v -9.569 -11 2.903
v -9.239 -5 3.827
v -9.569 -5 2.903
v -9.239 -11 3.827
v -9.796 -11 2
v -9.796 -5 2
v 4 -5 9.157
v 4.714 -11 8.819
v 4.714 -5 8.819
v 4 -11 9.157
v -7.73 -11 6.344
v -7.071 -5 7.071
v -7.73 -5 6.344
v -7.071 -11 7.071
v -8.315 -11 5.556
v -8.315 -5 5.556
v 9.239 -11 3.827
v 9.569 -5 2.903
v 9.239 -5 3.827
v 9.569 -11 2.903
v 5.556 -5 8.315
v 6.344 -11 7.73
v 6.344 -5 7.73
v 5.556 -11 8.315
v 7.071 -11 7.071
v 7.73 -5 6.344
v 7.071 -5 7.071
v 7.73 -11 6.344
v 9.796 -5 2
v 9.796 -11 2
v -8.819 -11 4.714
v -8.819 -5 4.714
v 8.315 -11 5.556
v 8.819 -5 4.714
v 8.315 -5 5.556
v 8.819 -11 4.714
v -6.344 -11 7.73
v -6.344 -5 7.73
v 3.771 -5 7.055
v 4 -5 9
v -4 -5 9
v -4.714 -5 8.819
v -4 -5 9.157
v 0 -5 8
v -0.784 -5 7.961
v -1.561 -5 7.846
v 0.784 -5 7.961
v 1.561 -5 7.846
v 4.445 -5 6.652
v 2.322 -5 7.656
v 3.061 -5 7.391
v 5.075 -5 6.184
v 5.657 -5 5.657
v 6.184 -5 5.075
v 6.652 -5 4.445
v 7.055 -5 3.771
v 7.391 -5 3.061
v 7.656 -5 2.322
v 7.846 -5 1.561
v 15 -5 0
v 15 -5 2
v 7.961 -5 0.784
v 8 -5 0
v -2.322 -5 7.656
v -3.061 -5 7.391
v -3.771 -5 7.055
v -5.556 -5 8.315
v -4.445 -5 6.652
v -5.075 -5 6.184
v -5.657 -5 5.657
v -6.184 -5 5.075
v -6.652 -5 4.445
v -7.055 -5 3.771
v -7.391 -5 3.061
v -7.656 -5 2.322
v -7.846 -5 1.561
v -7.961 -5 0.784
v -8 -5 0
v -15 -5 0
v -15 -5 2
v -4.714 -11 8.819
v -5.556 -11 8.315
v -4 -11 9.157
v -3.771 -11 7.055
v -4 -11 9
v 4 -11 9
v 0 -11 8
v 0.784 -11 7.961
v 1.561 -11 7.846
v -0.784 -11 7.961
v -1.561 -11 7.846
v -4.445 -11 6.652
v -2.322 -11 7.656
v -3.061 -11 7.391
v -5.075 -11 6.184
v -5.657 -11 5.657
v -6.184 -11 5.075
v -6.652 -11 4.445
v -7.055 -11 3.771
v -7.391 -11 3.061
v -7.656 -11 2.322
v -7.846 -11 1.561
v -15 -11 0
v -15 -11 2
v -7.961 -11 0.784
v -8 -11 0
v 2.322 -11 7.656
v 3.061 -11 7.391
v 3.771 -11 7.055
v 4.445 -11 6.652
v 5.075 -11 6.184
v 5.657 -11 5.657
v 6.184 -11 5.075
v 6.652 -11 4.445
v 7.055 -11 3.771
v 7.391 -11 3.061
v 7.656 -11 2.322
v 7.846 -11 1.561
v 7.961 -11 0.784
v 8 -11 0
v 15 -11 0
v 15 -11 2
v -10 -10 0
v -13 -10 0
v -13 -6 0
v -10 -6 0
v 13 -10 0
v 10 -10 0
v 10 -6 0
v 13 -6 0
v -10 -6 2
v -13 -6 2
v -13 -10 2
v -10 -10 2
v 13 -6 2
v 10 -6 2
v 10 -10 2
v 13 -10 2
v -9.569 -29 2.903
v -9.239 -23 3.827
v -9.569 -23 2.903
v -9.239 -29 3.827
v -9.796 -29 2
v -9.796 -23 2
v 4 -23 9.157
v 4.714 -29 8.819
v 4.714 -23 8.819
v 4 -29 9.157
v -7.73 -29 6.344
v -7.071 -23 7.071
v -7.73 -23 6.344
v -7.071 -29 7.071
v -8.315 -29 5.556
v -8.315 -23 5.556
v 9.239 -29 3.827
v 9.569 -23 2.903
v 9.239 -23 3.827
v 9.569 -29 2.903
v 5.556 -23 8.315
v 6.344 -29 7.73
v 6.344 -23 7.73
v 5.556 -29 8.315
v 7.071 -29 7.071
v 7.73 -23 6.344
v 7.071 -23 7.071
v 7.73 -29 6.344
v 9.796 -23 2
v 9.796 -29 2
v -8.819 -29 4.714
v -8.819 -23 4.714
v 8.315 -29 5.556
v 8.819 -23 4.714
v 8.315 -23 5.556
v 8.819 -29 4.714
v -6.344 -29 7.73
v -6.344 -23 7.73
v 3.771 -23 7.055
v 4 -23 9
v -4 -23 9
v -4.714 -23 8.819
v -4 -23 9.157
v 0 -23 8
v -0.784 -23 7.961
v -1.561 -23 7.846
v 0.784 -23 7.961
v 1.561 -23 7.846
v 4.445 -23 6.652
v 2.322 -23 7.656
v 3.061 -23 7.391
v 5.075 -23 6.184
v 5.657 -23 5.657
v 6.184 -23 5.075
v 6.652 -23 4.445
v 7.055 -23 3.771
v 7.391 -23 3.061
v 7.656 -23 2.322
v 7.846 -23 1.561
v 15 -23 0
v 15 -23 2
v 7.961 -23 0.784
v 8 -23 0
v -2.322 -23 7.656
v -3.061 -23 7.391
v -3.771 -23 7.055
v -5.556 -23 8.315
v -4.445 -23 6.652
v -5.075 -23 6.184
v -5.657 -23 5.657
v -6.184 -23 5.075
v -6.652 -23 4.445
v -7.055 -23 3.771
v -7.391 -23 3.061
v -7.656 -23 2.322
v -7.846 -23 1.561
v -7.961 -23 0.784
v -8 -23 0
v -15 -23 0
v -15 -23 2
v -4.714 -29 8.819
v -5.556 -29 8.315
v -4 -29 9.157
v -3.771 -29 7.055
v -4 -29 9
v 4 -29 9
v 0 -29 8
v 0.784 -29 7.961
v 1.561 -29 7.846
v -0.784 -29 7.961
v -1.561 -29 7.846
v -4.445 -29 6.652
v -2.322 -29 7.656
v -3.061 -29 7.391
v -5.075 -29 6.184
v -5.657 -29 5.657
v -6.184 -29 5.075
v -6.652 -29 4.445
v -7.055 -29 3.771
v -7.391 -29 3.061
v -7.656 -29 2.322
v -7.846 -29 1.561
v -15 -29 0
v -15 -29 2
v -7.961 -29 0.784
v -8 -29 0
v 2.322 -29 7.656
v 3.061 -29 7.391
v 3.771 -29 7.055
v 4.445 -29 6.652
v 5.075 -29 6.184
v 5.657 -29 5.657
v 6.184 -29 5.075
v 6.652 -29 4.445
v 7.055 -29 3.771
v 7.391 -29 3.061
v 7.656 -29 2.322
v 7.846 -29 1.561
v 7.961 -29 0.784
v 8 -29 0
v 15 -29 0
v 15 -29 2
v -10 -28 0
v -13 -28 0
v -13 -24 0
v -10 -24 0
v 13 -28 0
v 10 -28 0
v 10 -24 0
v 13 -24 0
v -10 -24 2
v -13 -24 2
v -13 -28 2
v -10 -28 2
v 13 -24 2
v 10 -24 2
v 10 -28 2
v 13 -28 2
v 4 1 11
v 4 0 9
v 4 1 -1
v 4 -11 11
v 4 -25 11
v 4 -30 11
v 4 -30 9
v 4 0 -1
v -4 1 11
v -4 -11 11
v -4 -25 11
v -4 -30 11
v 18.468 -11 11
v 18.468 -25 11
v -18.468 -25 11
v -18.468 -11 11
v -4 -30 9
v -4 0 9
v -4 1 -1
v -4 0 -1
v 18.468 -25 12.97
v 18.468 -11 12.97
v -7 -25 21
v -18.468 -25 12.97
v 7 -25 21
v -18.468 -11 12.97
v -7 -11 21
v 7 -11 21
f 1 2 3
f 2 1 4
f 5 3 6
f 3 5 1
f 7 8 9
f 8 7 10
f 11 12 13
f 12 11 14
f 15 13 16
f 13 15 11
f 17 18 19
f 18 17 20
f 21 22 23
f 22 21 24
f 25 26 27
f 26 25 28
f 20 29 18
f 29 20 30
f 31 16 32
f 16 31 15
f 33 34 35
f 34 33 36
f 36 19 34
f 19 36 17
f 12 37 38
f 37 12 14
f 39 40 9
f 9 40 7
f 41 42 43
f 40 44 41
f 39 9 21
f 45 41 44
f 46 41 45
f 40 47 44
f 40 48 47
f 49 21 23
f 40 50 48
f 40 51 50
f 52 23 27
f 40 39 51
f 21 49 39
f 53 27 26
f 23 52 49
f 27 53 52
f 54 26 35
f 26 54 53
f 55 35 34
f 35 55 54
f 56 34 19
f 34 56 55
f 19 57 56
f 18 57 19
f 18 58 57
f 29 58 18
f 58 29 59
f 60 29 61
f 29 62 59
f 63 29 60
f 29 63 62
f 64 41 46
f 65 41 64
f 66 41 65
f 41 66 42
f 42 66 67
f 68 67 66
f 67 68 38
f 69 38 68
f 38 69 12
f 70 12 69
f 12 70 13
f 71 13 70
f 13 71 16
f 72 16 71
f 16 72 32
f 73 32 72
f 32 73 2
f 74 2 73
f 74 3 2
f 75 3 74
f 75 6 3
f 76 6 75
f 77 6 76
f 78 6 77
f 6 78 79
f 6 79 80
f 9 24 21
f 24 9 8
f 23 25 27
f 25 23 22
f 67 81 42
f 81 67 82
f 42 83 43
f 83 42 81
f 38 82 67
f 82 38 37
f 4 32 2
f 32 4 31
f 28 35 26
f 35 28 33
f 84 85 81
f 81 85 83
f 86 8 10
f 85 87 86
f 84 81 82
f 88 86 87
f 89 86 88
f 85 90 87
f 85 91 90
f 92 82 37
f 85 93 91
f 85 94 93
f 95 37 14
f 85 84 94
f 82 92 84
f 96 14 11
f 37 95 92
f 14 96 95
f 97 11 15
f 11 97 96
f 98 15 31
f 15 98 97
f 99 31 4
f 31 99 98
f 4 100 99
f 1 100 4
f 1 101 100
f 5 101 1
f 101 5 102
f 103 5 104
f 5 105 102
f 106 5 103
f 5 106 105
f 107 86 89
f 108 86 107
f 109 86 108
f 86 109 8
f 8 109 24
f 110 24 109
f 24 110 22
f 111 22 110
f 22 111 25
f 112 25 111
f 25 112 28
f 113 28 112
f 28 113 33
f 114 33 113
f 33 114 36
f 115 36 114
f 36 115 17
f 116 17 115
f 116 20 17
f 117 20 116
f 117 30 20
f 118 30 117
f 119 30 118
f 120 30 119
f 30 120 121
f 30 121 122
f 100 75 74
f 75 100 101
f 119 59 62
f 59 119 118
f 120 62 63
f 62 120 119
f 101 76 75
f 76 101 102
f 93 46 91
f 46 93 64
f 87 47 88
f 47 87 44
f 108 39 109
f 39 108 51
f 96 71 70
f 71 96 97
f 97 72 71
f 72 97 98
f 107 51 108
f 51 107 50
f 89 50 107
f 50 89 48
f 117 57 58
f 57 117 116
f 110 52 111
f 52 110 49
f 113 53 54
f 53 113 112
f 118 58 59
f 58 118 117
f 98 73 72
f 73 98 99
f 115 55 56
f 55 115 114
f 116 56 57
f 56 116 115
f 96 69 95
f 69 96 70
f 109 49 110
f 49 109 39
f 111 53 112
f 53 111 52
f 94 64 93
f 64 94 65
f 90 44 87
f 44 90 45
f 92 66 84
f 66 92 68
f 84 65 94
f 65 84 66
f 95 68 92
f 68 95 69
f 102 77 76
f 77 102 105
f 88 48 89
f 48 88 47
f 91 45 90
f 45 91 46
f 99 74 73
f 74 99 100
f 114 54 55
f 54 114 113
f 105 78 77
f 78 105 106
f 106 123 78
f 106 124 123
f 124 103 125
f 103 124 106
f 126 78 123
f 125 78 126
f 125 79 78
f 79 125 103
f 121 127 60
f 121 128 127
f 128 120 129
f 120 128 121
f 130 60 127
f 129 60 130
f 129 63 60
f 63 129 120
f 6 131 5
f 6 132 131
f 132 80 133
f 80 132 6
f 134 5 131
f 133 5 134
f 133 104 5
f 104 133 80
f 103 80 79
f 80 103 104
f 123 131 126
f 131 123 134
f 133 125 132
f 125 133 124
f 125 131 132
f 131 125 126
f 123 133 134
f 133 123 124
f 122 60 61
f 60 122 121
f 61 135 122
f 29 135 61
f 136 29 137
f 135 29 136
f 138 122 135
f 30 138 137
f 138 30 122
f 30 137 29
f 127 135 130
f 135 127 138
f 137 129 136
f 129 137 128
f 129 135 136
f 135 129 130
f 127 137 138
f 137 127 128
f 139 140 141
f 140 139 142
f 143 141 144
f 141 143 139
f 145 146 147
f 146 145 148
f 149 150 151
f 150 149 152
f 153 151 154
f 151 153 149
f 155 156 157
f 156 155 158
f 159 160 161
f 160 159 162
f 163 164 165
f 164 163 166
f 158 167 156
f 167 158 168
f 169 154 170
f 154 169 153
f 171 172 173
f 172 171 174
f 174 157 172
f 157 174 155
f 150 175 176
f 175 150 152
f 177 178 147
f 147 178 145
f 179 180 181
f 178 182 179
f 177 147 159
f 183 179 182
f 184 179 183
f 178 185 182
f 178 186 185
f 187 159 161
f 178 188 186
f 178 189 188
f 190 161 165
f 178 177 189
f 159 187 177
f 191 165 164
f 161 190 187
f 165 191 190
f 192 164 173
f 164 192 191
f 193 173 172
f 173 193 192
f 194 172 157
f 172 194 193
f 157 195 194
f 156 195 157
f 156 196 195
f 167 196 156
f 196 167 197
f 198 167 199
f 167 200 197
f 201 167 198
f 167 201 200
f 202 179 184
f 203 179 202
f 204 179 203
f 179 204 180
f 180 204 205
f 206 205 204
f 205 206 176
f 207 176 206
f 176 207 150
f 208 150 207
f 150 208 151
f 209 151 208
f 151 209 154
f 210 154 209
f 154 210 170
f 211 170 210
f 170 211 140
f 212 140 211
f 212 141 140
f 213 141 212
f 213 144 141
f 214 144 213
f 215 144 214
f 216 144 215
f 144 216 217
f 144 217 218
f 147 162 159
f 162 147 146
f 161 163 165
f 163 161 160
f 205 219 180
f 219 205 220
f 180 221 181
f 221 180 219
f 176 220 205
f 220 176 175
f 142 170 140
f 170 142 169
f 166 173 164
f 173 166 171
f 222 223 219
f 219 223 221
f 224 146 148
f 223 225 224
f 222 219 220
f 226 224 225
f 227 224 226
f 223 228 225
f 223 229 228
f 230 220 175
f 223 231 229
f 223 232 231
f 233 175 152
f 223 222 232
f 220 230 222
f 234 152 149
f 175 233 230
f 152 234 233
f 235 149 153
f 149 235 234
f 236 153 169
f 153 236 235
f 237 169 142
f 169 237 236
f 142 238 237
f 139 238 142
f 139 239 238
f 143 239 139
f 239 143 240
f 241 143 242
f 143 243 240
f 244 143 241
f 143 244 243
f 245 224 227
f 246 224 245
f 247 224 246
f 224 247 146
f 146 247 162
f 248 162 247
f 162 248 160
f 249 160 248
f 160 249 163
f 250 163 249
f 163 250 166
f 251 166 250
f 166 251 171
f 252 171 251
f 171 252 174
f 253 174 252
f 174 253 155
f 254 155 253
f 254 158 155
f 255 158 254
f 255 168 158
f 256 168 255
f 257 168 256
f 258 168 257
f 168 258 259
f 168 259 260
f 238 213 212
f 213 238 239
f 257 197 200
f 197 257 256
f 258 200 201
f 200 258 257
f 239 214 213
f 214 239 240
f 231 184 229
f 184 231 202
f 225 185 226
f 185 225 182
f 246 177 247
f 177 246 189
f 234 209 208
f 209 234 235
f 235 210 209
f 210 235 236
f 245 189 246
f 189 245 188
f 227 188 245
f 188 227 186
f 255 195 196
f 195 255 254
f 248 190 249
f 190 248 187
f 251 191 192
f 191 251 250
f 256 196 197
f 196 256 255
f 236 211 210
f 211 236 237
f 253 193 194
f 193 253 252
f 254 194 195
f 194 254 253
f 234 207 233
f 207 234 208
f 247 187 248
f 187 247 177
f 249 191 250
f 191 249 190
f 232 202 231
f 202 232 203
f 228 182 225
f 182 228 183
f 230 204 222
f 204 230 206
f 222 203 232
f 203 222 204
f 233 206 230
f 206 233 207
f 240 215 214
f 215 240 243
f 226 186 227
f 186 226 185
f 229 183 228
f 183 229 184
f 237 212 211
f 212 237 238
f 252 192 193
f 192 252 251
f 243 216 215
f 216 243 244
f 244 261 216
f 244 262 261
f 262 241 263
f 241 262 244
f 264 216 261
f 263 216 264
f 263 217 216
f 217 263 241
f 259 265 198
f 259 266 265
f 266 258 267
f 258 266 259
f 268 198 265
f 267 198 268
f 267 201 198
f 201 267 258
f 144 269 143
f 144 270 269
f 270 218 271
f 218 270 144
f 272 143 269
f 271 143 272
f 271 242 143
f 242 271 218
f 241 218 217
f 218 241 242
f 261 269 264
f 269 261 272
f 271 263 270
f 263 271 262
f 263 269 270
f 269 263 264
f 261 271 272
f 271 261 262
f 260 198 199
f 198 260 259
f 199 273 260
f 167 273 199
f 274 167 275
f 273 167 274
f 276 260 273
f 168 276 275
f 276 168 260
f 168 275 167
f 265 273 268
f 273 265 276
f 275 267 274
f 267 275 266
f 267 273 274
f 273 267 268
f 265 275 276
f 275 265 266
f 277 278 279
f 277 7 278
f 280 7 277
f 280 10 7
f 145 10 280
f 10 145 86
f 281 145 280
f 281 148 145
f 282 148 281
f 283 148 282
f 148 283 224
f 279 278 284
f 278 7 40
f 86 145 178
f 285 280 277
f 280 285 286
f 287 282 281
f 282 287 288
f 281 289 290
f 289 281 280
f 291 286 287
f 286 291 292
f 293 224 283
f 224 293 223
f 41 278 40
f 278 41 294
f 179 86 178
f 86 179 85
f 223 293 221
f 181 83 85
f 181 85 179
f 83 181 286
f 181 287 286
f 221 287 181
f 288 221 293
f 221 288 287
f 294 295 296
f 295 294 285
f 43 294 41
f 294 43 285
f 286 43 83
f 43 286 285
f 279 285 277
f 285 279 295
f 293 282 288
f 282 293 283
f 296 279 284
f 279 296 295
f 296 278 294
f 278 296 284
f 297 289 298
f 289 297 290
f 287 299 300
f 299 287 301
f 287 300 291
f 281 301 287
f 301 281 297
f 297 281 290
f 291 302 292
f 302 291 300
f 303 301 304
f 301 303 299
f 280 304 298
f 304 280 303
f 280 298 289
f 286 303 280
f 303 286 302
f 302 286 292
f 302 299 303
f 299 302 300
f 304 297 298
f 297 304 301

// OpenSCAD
// Experimental dorsal middle-finger fixture. Units: mm.
// Nominal dimensions are candidate values, not fit/accuracy claims.
// Frame R: origin at fingertip stop; +Y distal, +Z dorsal, +X lateral.
$fn = 64;
finger_radius_mm = 8;
face_angle_degrees = 35;
wall_mm = 2;
support_spacing_mm = 18;
support_length_mm = 6;
marker_edge_mm = 10;
quiet_zone_mm = 2;
target_height_mm = 10;
face_edge = marker_edge_mm + 2*quiet_zone_mm;
outer_radius = finger_radius_mm + wall_mm;
target_base_z = finger_radius_mm + 3;
outer_half_width = face_edge/2 + face_edge*cos(face_angle_degrees);
side_bottom_z = target_height_mm - face_edge*sin(face_angle_degrees);

assert(finger_radius_mm >= 6 && finger_radius_mm <= 12, "Candidate radius out of experiment range");
assert(face_angle_degrees >= 20 && face_angle_degrees <= 45, "Candidate angle out of experiment range");
assert(side_bottom_z > 0, "Target sides must remain above mounting plane");

module dorsal_support(y) {
    translate([0,y,0]) {
        intersection() {
            difference() {
                rotate([90,0,0]) cylinder(r=outer_radius,h=support_length_mm,center=true);
                rotate([90,0,0]) cylinder(r=finger_radius_mm,h=support_length_mm+2,center=true);
            }
            translate([-outer_radius,-support_length_mm/2,0])
                cube([2*outer_radius,support_length_mm,outer_radius+1]);
        }
        // Strap slots; strap/liner choices require separate fit tests.
        for (sign=[-1,1]) {
            translate([sign*(outer_radius+1.5),0,1]) difference() {
                cube([7,support_length_mm,2],center=true);
                cube([3,support_length_mm-2,4],center=true);
            }
        }
    }
}

module three_face_target() {
    translate([0,-18,target_base_z]) rotate([90,0,0])
        linear_extrude(height=face_edge,center=true)
            polygon(points=[[-outer_half_width,0],[outer_half_width,0],
                [outer_half_width,side_bottom_z],[face_edge/2,target_height_mm],
                [-face_edge/2,target_height_mm],[-outer_half_width,side_bottom_z]]);
}

union() {
    dorsal_support(-8);
    dorsal_support(-8-support_spacing_mm);
    // Dorsal bridge connects both registration regions and the target mount.
    translate([-4,-30,outer_radius-1]) cube([8,31,2]);
    // Stop's proximal surface at Y=0 defines the nominal anatomical tip reference.
    translate([-4,0,-1]) cube([8,1,outer_radius+2]);
    three_face_target();
}

echo(candidate_tip_R_mm=[0,0,0]);
echo(central_face_center_R_mm=[0,-18,target_base_z+target_height_mm]);
echo(right_face_center_R_mm=[face_edge/2+face_edge/2*cos(face_angle_degrees),-18,
    target_base_z+target_height_mm-face_edge/2*sin(face_angle_degrees)]);
echo(left_face_center_R_mm=[-face_edge/2-face_edge/2*cos(face_angle_degrees),-18,
    target_base_z+target_height_mm-face_edge/2*sin(face_angle_degrees)]);
